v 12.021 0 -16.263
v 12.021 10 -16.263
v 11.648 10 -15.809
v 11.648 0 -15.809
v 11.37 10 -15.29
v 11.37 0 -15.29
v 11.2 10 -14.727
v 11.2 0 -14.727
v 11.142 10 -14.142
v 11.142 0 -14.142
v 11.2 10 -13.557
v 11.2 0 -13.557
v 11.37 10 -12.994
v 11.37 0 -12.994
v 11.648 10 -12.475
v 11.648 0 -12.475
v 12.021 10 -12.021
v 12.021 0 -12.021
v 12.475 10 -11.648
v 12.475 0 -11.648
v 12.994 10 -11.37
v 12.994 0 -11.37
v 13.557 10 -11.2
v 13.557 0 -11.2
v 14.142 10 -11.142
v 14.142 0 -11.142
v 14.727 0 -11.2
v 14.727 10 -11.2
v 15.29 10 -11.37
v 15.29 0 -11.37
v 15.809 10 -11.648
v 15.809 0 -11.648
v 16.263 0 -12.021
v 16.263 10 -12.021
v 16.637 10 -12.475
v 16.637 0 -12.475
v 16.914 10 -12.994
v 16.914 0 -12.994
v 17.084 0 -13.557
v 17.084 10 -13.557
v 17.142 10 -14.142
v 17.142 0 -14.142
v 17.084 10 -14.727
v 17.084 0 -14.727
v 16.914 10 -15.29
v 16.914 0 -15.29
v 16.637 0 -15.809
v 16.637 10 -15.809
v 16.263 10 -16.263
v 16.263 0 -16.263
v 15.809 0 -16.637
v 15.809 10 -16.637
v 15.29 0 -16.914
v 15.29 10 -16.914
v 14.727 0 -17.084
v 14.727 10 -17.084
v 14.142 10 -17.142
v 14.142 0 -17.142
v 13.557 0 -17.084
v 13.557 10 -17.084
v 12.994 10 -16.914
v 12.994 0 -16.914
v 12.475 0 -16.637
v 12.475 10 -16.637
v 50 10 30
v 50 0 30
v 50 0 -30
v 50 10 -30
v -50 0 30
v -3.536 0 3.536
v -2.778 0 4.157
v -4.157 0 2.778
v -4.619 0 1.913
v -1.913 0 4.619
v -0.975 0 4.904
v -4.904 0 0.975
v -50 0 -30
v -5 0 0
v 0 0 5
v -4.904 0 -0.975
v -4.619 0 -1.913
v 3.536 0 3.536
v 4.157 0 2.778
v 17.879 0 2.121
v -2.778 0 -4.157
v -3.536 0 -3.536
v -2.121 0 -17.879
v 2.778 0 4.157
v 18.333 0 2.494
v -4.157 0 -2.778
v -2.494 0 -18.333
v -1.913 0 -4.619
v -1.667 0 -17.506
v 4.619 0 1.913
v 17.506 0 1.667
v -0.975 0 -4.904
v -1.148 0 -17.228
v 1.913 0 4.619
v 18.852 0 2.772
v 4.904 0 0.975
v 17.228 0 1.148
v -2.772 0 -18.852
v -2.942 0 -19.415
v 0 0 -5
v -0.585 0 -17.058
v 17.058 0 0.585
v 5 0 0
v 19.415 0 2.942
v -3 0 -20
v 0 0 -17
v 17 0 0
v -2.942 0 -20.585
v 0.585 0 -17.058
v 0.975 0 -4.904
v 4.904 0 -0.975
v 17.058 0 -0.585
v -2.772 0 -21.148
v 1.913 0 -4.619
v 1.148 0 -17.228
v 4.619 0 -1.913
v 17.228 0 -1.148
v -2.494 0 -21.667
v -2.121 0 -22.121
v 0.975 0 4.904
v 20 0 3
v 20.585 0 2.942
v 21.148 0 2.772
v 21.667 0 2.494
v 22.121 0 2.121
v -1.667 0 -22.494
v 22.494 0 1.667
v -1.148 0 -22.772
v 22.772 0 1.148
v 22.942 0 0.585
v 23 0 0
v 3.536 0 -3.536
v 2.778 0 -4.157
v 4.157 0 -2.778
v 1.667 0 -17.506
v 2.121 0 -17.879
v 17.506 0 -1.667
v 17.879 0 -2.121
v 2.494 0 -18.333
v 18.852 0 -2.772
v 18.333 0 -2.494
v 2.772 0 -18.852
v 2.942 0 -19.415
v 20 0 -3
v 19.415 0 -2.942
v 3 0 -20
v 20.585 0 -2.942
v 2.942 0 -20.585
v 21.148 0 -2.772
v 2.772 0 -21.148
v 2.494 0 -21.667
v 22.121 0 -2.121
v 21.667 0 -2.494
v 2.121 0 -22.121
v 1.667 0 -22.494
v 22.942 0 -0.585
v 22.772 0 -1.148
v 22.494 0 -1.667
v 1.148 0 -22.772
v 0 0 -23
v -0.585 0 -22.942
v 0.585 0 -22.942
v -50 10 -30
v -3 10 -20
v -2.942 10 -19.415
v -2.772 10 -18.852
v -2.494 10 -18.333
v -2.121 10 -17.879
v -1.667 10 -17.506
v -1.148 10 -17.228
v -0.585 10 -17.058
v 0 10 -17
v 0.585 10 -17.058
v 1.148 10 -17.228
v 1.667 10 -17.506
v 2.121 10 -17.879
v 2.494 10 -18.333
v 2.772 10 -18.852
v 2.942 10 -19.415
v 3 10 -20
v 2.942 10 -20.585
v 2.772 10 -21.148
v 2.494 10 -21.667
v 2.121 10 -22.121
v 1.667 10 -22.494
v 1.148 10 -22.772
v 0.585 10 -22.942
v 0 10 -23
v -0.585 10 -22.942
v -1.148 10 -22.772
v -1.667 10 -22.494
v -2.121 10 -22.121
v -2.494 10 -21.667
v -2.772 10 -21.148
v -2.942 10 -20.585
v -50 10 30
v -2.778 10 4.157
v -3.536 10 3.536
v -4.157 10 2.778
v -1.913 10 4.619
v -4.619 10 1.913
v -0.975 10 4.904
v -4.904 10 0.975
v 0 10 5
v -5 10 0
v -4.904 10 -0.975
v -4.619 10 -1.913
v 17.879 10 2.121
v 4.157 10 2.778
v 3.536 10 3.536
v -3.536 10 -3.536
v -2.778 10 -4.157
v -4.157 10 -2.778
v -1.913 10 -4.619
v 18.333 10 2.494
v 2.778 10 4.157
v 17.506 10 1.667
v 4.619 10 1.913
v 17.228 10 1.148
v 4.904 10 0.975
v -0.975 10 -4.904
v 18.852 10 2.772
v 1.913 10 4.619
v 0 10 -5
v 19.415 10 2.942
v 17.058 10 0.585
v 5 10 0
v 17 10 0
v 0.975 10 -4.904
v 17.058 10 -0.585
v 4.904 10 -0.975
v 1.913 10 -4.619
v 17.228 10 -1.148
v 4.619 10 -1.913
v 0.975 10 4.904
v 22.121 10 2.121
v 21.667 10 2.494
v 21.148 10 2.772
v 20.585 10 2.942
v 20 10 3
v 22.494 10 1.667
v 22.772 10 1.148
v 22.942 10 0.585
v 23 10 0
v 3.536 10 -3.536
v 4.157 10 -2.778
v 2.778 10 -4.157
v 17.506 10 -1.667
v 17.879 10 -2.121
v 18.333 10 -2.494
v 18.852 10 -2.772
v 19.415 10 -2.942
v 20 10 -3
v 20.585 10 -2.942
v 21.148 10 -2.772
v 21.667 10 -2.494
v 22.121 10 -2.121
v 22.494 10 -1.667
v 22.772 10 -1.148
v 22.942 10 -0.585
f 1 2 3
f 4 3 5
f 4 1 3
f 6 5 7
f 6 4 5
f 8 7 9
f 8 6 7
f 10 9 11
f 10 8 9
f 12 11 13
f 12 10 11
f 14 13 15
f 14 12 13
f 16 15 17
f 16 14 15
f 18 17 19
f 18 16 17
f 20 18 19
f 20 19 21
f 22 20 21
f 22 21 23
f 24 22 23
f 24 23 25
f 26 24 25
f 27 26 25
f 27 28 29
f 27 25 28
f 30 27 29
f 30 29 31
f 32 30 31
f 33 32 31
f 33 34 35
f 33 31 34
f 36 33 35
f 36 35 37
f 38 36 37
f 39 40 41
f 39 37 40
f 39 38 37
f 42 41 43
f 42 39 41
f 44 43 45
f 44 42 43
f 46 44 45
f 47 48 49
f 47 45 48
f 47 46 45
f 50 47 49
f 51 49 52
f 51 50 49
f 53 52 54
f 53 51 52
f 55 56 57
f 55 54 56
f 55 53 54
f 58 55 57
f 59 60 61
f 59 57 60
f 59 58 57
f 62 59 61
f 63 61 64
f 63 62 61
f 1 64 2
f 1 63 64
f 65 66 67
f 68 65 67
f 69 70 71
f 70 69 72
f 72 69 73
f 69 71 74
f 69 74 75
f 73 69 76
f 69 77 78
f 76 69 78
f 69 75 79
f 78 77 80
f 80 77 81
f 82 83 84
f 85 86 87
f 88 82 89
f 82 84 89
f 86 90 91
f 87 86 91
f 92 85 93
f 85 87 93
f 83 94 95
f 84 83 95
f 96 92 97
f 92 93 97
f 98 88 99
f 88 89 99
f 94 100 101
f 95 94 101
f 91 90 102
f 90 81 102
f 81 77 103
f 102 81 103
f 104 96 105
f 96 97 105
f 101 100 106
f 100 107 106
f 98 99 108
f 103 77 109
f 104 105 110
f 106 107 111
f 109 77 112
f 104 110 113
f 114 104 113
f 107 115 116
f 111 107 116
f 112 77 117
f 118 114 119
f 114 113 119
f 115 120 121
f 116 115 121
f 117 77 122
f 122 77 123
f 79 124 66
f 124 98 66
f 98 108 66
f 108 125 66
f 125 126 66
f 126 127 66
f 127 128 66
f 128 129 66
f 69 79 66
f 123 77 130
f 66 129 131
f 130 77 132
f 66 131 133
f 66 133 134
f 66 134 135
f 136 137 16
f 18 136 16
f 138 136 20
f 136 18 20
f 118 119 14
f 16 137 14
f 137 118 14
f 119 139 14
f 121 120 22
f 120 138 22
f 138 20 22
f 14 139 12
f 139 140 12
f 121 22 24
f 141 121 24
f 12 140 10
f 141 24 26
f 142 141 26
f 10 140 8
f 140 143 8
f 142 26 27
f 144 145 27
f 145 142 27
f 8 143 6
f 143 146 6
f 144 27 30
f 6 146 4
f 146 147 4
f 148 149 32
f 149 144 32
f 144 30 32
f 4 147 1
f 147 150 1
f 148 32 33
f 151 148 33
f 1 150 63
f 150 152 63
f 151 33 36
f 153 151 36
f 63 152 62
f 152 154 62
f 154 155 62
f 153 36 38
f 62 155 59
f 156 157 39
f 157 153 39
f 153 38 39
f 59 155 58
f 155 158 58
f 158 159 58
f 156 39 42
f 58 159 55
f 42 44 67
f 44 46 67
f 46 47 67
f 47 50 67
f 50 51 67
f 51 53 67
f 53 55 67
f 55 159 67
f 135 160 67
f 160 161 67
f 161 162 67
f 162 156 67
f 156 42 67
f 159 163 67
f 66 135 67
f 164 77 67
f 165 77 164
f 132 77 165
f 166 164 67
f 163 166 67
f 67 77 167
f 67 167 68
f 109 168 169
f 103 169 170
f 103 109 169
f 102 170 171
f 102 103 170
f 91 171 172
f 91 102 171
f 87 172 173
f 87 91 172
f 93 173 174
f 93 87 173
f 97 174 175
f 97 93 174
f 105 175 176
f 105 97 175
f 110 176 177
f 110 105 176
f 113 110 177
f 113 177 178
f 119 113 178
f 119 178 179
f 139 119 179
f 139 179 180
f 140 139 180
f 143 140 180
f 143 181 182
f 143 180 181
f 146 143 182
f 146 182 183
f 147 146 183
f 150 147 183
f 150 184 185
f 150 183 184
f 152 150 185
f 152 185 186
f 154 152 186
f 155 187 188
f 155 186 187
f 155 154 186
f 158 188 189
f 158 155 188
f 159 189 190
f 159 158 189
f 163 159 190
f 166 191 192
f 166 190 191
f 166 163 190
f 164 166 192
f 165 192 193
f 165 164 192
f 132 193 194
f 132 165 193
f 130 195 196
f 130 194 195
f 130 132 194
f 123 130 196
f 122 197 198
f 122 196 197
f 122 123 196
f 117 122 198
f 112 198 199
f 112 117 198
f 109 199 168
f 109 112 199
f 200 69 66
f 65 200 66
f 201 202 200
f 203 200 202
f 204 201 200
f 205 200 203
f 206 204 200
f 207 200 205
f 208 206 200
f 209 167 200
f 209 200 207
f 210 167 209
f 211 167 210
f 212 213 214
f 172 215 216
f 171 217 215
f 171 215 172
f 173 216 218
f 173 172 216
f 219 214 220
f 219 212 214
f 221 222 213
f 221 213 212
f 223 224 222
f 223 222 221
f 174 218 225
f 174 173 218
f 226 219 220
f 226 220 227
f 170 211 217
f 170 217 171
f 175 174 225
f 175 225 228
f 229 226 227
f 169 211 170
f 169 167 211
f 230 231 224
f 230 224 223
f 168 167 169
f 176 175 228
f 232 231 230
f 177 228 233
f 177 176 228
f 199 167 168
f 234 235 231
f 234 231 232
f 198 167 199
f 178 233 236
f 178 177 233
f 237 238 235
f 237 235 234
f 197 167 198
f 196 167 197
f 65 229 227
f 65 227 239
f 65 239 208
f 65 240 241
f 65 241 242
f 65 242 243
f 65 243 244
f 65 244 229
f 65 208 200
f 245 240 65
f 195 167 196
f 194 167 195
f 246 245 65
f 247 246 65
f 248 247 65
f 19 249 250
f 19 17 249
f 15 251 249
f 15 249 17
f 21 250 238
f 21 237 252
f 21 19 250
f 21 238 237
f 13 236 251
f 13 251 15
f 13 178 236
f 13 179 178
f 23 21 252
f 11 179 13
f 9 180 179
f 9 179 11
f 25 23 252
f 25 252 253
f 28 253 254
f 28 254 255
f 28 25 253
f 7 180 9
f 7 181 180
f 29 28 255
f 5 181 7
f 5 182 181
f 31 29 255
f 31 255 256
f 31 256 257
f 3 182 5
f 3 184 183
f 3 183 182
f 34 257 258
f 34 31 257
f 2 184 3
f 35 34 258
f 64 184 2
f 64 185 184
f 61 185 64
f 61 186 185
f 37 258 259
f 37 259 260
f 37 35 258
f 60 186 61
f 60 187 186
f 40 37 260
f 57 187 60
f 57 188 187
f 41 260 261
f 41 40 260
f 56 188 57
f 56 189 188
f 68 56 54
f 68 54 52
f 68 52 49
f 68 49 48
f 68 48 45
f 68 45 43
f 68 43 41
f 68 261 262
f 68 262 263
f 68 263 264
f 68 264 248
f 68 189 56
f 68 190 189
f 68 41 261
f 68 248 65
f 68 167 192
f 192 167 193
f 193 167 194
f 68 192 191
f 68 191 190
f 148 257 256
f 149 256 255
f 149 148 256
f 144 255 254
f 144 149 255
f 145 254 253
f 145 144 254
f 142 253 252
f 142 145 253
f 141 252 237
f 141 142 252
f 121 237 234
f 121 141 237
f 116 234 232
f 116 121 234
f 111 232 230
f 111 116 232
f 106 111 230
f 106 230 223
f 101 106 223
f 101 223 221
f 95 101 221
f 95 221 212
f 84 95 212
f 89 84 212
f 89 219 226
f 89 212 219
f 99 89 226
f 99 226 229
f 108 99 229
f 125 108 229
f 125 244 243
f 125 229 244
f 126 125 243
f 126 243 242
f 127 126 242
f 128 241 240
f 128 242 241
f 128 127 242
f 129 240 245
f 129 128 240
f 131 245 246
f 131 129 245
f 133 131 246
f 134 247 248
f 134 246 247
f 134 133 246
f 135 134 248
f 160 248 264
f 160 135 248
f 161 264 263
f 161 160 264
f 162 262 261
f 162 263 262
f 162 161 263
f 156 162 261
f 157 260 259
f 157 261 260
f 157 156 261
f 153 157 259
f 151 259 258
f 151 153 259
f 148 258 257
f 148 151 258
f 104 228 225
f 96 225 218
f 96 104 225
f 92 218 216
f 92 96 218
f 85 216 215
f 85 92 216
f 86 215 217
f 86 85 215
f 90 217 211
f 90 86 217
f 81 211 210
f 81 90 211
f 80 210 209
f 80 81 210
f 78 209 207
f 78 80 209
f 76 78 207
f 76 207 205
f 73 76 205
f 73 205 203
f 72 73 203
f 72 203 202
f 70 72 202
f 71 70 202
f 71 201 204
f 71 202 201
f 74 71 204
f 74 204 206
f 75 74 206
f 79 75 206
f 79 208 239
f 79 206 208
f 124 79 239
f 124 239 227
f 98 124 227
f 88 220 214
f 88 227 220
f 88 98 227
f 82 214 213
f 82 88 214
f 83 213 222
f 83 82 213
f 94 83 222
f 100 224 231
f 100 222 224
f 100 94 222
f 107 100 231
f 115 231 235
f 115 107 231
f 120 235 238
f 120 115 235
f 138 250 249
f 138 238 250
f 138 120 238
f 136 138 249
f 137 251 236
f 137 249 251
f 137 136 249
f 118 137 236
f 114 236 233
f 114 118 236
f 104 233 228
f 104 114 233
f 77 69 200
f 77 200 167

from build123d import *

# Parameters (mm, degrees)
SKETCH_1_W               = 100
SKETCH_1_H               = 60
EXTRUDE_1_DEPTH          = 10
SKETCH_2_R               = 5
CUT_EXTRUDE_1_DEPTH      = 20
SKETCH_3_R               = 3
CUT_EXTRUDE_2_DEPTH      = 20
PATTERN_CIRCULAR_1_COUNT = 3
PATTERN_CIRCULAR_1_ANGLE = 90


with BuildPart() as part:
    # 草图1 → 凸台-拉伸1 (new body)
    with BuildSketch(Plane(origin=(0, 0, 0), x_dir=(1, 0, 0), z_dir=(0, 1, 0))):
        Rectangle(SKETCH_1_W, SKETCH_1_H)
    extrude(amount=EXTRUDE_1_DEPTH)

    # 草图2 → 切除-拉伸1 (cut)
    with BuildSketch(Plane(origin=(0, 0, 0), x_dir=(1, 0, 0), z_dir=(0, 1, 0))):
        with Locations(Location((0, 0, 0), (0, 0, 90))):
            Circle(SKETCH_2_R)
    extrude(amount=CUT_EXTRUDE_1_DEPTH, mode=Mode.SUBTRACT)

    # 草图3 → 切除-拉伸2 (cut)
    with BuildSketch(Plane(origin=(0, 0, 0), x_dir=(1, 0, 0), z_dir=(0, 1, 0))):
        with Locations(Location((20, 0, 0), (0, 0, 90))):
            Circle(SKETCH_3_R)
    cut_extrude_2 = extrude(amount=CUT_EXTRUDE_2_DEPTH, mode=Mode.SUBTRACT)

    # 阵列(圆周)1: 切除-拉伸2 ×3 about axis
    pattern_circular_1_axis = Axis((0, 0, 0), (0, 1, 0))
    for i in range(1, PATTERN_CIRCULAR_1_COUNT):
        add(cut_extrude_2.rotate(pattern_circular_1_axis, i * PATTERN_CIRCULAR_1_ANGLE / (PATTERN_CIRCULAR_1_COUNT - 1)), mode=Mode.SUBTRACT)


solid = part.part
